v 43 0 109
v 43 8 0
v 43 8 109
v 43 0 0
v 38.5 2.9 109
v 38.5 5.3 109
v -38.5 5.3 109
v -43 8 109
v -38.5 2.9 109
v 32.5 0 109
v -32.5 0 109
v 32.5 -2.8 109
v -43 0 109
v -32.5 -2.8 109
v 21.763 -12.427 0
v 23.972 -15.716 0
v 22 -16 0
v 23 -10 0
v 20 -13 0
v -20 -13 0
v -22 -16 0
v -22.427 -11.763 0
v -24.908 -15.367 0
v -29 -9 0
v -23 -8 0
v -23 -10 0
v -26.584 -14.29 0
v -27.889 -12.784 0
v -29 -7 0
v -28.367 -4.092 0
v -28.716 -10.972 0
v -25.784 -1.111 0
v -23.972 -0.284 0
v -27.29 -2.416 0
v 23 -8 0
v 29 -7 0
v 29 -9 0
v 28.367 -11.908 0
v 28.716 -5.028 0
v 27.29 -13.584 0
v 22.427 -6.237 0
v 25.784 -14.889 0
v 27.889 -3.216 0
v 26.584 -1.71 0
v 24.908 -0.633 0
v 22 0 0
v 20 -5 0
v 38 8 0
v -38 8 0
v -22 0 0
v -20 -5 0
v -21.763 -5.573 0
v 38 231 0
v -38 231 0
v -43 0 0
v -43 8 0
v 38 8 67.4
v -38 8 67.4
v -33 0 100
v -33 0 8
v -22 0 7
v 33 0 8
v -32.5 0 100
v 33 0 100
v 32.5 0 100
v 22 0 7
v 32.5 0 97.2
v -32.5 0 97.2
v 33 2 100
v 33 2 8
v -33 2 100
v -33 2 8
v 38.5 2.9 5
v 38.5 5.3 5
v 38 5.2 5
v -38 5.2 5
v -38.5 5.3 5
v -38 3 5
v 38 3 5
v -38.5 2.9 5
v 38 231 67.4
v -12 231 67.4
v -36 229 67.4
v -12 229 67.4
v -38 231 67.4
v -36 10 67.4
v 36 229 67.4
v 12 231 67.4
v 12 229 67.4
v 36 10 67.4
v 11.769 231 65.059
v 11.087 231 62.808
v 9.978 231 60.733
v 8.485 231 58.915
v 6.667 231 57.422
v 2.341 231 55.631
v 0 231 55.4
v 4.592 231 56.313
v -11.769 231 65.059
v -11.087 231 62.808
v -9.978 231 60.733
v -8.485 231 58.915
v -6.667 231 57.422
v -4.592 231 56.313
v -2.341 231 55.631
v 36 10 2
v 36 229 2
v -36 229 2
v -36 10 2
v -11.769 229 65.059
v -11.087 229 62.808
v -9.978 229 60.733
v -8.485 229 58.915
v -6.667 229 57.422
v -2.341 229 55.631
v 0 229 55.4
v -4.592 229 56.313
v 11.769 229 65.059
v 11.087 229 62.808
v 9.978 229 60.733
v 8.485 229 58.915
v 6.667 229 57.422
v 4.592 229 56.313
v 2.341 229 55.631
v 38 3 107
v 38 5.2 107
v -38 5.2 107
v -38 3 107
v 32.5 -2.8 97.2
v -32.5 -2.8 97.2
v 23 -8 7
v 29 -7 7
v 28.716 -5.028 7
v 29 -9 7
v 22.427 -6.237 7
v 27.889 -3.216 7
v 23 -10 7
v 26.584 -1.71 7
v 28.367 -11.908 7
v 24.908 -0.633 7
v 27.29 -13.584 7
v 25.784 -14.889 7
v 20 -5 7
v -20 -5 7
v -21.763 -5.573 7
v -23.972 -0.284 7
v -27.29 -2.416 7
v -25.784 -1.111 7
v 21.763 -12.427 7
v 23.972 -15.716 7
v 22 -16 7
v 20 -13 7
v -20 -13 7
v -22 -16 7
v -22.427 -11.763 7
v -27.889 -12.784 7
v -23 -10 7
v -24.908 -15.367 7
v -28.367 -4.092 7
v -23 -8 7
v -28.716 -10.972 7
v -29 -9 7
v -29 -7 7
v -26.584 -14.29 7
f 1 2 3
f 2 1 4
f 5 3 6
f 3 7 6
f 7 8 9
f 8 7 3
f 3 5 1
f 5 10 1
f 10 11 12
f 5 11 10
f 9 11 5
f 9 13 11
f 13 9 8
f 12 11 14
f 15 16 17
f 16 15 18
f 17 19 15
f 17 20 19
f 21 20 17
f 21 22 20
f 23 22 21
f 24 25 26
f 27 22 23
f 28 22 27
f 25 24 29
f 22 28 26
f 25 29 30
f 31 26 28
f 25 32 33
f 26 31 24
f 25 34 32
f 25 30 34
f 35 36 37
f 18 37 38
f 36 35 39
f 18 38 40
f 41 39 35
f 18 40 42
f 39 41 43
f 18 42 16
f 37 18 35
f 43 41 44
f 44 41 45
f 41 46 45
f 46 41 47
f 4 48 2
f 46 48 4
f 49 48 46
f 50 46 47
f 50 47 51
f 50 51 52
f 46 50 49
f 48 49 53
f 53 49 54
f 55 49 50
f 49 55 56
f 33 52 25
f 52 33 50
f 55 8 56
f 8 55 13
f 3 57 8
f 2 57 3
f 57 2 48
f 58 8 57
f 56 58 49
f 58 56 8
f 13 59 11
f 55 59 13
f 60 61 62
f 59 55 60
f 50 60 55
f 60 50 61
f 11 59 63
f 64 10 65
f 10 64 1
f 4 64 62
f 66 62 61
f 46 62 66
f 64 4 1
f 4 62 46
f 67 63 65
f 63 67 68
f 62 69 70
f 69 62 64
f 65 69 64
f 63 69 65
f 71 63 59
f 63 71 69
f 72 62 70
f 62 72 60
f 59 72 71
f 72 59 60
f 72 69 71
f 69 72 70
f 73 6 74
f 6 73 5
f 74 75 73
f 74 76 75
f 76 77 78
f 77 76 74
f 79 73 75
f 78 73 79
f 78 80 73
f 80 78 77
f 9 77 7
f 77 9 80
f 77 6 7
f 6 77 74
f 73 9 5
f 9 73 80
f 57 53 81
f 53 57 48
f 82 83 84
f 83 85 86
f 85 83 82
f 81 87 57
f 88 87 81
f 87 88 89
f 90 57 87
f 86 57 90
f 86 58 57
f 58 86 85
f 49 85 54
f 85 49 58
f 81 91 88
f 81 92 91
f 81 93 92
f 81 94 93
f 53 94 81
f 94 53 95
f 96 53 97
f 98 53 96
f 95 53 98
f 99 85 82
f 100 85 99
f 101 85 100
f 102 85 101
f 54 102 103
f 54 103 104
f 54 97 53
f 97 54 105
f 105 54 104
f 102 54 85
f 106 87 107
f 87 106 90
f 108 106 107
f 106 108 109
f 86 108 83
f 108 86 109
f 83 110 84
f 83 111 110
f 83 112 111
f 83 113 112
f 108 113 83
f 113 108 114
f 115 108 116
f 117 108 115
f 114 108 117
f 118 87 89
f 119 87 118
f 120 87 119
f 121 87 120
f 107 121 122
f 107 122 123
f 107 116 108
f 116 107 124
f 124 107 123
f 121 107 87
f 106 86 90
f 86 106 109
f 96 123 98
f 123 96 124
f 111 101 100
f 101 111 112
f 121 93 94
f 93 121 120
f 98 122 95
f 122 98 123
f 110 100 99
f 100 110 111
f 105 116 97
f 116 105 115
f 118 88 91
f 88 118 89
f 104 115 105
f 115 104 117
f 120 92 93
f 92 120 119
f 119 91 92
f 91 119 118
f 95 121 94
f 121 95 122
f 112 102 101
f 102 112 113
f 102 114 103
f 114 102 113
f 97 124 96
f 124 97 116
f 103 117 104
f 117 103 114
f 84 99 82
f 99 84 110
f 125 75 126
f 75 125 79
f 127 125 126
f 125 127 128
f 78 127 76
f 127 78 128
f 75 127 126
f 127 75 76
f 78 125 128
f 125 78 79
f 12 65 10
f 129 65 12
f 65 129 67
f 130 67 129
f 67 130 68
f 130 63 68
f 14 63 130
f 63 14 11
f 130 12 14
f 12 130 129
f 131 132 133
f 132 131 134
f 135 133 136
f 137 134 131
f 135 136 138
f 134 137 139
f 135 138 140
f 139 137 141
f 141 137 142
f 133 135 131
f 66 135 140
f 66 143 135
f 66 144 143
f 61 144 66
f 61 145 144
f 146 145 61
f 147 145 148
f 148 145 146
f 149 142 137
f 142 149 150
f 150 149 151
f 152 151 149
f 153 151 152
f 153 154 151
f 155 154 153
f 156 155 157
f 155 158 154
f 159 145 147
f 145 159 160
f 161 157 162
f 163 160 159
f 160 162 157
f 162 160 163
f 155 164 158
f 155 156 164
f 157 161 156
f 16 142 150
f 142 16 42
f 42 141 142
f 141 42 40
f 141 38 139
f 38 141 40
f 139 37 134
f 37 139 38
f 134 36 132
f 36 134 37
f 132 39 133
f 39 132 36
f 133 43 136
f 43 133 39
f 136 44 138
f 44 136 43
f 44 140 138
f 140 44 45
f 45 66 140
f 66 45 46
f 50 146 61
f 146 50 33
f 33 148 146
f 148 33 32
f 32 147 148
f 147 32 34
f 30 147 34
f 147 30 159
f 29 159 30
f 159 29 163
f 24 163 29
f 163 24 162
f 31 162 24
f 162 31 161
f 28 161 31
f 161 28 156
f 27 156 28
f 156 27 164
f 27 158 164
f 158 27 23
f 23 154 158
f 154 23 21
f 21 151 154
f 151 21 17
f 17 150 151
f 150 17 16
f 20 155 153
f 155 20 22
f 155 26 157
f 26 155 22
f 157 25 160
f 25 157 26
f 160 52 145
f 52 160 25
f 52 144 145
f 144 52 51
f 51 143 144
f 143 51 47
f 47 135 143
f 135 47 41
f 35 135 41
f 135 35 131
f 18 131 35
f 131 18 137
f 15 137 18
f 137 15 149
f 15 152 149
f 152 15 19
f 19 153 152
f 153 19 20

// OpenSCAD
// Card Catalog v1.2 drawer (MakerWorld 3016550, by Aspect of Frost): the bin the sorter drops
// cards into. Nic prints these from the MakerWorld 3MF (not in this repo), so this file only
// DRAWS one for the enclosure preview, from the sizes measured off that 3MF on 2026-10-25:
//
//   tray         76.0 wide x 67.4 tall x 223.0 long. 2 mm walls (3.5 mm along the bottom
//                band), honeycomb floor, divider grooves along the inside walls
//   front plate  86.0 wide x 109.0 tall x 8.0 thick, its bottom flush with the tray's. The
//                toploader pocket is open at the top, behind a 3 mm frame, and closed by a
//                clip-on bar ("drawer top", 65 x 11.8 mm) that hooks into the plate's top corners
//   handle       loop at the bottom of the plate, 16 mm proud, 58 mm wide
//   its box      plates sit side by side at 86.5 mm pitch in an 8 mm deep rebate at the mouth,
//                flush with the box face; the cubby behind is 76.6 wide, the tray rides on
//                the cubby floor, 113.5 mm of room above it for the plate and its bar
//
// Origin: middle of the plate's front face, on the floor. x across, y back, z up.

module cc_rr(w, l, r) { offset(r = r) offset(delta = -r) square([w, l], center = true); }

module card_catalog_drawer(w = 76, body_h = 67.4, l = 231, face_w = 86, face_h = 109, face_t = 8) {
    tray_l = l - face_t;
    // front plate: frame with the window the toploader shows through
    difference() {
        translate([-face_w / 2, 0, 0]) cube([face_w, face_t, face_h]);
        translate([-33, -1, 8]) cube([66, 3, 92]);
        translate([-38.5, 2.9, 5]) cube([77, 2.4, face_h]);   // the pocket, open at the top
    }
    color("#9fb7c4", 0.6) translate([-38, 3, 5]) cube([76, 2.2, 102]);   // 3 x 4 toploader
    // clip-on top bar
    translate([-32.5, -2.8, face_h - 11.8]) cube([65, 2.8, 11.8]);
    // handle loop
    linear_extrude(7) difference() {
        translate([0, -8]) cc_rr(58, 16, 7);
        translate([0, -9]) cc_rr(46, 8, 3);
    }
    // tray
    translate([-w / 2, face_t, 0]) difference() {
        cube([w, tray_l, body_h]);
        translate([2, 2, 2]) cube([w - 4, tray_l - 4, body_h]);
        // finger notch at the back
        translate([w / 2, tray_l + 1, body_h]) rotate([90, 0, 0]) cylinder(r = 12, h = 4, $fn = 32);
    }
}

card_catalog_drawer();
